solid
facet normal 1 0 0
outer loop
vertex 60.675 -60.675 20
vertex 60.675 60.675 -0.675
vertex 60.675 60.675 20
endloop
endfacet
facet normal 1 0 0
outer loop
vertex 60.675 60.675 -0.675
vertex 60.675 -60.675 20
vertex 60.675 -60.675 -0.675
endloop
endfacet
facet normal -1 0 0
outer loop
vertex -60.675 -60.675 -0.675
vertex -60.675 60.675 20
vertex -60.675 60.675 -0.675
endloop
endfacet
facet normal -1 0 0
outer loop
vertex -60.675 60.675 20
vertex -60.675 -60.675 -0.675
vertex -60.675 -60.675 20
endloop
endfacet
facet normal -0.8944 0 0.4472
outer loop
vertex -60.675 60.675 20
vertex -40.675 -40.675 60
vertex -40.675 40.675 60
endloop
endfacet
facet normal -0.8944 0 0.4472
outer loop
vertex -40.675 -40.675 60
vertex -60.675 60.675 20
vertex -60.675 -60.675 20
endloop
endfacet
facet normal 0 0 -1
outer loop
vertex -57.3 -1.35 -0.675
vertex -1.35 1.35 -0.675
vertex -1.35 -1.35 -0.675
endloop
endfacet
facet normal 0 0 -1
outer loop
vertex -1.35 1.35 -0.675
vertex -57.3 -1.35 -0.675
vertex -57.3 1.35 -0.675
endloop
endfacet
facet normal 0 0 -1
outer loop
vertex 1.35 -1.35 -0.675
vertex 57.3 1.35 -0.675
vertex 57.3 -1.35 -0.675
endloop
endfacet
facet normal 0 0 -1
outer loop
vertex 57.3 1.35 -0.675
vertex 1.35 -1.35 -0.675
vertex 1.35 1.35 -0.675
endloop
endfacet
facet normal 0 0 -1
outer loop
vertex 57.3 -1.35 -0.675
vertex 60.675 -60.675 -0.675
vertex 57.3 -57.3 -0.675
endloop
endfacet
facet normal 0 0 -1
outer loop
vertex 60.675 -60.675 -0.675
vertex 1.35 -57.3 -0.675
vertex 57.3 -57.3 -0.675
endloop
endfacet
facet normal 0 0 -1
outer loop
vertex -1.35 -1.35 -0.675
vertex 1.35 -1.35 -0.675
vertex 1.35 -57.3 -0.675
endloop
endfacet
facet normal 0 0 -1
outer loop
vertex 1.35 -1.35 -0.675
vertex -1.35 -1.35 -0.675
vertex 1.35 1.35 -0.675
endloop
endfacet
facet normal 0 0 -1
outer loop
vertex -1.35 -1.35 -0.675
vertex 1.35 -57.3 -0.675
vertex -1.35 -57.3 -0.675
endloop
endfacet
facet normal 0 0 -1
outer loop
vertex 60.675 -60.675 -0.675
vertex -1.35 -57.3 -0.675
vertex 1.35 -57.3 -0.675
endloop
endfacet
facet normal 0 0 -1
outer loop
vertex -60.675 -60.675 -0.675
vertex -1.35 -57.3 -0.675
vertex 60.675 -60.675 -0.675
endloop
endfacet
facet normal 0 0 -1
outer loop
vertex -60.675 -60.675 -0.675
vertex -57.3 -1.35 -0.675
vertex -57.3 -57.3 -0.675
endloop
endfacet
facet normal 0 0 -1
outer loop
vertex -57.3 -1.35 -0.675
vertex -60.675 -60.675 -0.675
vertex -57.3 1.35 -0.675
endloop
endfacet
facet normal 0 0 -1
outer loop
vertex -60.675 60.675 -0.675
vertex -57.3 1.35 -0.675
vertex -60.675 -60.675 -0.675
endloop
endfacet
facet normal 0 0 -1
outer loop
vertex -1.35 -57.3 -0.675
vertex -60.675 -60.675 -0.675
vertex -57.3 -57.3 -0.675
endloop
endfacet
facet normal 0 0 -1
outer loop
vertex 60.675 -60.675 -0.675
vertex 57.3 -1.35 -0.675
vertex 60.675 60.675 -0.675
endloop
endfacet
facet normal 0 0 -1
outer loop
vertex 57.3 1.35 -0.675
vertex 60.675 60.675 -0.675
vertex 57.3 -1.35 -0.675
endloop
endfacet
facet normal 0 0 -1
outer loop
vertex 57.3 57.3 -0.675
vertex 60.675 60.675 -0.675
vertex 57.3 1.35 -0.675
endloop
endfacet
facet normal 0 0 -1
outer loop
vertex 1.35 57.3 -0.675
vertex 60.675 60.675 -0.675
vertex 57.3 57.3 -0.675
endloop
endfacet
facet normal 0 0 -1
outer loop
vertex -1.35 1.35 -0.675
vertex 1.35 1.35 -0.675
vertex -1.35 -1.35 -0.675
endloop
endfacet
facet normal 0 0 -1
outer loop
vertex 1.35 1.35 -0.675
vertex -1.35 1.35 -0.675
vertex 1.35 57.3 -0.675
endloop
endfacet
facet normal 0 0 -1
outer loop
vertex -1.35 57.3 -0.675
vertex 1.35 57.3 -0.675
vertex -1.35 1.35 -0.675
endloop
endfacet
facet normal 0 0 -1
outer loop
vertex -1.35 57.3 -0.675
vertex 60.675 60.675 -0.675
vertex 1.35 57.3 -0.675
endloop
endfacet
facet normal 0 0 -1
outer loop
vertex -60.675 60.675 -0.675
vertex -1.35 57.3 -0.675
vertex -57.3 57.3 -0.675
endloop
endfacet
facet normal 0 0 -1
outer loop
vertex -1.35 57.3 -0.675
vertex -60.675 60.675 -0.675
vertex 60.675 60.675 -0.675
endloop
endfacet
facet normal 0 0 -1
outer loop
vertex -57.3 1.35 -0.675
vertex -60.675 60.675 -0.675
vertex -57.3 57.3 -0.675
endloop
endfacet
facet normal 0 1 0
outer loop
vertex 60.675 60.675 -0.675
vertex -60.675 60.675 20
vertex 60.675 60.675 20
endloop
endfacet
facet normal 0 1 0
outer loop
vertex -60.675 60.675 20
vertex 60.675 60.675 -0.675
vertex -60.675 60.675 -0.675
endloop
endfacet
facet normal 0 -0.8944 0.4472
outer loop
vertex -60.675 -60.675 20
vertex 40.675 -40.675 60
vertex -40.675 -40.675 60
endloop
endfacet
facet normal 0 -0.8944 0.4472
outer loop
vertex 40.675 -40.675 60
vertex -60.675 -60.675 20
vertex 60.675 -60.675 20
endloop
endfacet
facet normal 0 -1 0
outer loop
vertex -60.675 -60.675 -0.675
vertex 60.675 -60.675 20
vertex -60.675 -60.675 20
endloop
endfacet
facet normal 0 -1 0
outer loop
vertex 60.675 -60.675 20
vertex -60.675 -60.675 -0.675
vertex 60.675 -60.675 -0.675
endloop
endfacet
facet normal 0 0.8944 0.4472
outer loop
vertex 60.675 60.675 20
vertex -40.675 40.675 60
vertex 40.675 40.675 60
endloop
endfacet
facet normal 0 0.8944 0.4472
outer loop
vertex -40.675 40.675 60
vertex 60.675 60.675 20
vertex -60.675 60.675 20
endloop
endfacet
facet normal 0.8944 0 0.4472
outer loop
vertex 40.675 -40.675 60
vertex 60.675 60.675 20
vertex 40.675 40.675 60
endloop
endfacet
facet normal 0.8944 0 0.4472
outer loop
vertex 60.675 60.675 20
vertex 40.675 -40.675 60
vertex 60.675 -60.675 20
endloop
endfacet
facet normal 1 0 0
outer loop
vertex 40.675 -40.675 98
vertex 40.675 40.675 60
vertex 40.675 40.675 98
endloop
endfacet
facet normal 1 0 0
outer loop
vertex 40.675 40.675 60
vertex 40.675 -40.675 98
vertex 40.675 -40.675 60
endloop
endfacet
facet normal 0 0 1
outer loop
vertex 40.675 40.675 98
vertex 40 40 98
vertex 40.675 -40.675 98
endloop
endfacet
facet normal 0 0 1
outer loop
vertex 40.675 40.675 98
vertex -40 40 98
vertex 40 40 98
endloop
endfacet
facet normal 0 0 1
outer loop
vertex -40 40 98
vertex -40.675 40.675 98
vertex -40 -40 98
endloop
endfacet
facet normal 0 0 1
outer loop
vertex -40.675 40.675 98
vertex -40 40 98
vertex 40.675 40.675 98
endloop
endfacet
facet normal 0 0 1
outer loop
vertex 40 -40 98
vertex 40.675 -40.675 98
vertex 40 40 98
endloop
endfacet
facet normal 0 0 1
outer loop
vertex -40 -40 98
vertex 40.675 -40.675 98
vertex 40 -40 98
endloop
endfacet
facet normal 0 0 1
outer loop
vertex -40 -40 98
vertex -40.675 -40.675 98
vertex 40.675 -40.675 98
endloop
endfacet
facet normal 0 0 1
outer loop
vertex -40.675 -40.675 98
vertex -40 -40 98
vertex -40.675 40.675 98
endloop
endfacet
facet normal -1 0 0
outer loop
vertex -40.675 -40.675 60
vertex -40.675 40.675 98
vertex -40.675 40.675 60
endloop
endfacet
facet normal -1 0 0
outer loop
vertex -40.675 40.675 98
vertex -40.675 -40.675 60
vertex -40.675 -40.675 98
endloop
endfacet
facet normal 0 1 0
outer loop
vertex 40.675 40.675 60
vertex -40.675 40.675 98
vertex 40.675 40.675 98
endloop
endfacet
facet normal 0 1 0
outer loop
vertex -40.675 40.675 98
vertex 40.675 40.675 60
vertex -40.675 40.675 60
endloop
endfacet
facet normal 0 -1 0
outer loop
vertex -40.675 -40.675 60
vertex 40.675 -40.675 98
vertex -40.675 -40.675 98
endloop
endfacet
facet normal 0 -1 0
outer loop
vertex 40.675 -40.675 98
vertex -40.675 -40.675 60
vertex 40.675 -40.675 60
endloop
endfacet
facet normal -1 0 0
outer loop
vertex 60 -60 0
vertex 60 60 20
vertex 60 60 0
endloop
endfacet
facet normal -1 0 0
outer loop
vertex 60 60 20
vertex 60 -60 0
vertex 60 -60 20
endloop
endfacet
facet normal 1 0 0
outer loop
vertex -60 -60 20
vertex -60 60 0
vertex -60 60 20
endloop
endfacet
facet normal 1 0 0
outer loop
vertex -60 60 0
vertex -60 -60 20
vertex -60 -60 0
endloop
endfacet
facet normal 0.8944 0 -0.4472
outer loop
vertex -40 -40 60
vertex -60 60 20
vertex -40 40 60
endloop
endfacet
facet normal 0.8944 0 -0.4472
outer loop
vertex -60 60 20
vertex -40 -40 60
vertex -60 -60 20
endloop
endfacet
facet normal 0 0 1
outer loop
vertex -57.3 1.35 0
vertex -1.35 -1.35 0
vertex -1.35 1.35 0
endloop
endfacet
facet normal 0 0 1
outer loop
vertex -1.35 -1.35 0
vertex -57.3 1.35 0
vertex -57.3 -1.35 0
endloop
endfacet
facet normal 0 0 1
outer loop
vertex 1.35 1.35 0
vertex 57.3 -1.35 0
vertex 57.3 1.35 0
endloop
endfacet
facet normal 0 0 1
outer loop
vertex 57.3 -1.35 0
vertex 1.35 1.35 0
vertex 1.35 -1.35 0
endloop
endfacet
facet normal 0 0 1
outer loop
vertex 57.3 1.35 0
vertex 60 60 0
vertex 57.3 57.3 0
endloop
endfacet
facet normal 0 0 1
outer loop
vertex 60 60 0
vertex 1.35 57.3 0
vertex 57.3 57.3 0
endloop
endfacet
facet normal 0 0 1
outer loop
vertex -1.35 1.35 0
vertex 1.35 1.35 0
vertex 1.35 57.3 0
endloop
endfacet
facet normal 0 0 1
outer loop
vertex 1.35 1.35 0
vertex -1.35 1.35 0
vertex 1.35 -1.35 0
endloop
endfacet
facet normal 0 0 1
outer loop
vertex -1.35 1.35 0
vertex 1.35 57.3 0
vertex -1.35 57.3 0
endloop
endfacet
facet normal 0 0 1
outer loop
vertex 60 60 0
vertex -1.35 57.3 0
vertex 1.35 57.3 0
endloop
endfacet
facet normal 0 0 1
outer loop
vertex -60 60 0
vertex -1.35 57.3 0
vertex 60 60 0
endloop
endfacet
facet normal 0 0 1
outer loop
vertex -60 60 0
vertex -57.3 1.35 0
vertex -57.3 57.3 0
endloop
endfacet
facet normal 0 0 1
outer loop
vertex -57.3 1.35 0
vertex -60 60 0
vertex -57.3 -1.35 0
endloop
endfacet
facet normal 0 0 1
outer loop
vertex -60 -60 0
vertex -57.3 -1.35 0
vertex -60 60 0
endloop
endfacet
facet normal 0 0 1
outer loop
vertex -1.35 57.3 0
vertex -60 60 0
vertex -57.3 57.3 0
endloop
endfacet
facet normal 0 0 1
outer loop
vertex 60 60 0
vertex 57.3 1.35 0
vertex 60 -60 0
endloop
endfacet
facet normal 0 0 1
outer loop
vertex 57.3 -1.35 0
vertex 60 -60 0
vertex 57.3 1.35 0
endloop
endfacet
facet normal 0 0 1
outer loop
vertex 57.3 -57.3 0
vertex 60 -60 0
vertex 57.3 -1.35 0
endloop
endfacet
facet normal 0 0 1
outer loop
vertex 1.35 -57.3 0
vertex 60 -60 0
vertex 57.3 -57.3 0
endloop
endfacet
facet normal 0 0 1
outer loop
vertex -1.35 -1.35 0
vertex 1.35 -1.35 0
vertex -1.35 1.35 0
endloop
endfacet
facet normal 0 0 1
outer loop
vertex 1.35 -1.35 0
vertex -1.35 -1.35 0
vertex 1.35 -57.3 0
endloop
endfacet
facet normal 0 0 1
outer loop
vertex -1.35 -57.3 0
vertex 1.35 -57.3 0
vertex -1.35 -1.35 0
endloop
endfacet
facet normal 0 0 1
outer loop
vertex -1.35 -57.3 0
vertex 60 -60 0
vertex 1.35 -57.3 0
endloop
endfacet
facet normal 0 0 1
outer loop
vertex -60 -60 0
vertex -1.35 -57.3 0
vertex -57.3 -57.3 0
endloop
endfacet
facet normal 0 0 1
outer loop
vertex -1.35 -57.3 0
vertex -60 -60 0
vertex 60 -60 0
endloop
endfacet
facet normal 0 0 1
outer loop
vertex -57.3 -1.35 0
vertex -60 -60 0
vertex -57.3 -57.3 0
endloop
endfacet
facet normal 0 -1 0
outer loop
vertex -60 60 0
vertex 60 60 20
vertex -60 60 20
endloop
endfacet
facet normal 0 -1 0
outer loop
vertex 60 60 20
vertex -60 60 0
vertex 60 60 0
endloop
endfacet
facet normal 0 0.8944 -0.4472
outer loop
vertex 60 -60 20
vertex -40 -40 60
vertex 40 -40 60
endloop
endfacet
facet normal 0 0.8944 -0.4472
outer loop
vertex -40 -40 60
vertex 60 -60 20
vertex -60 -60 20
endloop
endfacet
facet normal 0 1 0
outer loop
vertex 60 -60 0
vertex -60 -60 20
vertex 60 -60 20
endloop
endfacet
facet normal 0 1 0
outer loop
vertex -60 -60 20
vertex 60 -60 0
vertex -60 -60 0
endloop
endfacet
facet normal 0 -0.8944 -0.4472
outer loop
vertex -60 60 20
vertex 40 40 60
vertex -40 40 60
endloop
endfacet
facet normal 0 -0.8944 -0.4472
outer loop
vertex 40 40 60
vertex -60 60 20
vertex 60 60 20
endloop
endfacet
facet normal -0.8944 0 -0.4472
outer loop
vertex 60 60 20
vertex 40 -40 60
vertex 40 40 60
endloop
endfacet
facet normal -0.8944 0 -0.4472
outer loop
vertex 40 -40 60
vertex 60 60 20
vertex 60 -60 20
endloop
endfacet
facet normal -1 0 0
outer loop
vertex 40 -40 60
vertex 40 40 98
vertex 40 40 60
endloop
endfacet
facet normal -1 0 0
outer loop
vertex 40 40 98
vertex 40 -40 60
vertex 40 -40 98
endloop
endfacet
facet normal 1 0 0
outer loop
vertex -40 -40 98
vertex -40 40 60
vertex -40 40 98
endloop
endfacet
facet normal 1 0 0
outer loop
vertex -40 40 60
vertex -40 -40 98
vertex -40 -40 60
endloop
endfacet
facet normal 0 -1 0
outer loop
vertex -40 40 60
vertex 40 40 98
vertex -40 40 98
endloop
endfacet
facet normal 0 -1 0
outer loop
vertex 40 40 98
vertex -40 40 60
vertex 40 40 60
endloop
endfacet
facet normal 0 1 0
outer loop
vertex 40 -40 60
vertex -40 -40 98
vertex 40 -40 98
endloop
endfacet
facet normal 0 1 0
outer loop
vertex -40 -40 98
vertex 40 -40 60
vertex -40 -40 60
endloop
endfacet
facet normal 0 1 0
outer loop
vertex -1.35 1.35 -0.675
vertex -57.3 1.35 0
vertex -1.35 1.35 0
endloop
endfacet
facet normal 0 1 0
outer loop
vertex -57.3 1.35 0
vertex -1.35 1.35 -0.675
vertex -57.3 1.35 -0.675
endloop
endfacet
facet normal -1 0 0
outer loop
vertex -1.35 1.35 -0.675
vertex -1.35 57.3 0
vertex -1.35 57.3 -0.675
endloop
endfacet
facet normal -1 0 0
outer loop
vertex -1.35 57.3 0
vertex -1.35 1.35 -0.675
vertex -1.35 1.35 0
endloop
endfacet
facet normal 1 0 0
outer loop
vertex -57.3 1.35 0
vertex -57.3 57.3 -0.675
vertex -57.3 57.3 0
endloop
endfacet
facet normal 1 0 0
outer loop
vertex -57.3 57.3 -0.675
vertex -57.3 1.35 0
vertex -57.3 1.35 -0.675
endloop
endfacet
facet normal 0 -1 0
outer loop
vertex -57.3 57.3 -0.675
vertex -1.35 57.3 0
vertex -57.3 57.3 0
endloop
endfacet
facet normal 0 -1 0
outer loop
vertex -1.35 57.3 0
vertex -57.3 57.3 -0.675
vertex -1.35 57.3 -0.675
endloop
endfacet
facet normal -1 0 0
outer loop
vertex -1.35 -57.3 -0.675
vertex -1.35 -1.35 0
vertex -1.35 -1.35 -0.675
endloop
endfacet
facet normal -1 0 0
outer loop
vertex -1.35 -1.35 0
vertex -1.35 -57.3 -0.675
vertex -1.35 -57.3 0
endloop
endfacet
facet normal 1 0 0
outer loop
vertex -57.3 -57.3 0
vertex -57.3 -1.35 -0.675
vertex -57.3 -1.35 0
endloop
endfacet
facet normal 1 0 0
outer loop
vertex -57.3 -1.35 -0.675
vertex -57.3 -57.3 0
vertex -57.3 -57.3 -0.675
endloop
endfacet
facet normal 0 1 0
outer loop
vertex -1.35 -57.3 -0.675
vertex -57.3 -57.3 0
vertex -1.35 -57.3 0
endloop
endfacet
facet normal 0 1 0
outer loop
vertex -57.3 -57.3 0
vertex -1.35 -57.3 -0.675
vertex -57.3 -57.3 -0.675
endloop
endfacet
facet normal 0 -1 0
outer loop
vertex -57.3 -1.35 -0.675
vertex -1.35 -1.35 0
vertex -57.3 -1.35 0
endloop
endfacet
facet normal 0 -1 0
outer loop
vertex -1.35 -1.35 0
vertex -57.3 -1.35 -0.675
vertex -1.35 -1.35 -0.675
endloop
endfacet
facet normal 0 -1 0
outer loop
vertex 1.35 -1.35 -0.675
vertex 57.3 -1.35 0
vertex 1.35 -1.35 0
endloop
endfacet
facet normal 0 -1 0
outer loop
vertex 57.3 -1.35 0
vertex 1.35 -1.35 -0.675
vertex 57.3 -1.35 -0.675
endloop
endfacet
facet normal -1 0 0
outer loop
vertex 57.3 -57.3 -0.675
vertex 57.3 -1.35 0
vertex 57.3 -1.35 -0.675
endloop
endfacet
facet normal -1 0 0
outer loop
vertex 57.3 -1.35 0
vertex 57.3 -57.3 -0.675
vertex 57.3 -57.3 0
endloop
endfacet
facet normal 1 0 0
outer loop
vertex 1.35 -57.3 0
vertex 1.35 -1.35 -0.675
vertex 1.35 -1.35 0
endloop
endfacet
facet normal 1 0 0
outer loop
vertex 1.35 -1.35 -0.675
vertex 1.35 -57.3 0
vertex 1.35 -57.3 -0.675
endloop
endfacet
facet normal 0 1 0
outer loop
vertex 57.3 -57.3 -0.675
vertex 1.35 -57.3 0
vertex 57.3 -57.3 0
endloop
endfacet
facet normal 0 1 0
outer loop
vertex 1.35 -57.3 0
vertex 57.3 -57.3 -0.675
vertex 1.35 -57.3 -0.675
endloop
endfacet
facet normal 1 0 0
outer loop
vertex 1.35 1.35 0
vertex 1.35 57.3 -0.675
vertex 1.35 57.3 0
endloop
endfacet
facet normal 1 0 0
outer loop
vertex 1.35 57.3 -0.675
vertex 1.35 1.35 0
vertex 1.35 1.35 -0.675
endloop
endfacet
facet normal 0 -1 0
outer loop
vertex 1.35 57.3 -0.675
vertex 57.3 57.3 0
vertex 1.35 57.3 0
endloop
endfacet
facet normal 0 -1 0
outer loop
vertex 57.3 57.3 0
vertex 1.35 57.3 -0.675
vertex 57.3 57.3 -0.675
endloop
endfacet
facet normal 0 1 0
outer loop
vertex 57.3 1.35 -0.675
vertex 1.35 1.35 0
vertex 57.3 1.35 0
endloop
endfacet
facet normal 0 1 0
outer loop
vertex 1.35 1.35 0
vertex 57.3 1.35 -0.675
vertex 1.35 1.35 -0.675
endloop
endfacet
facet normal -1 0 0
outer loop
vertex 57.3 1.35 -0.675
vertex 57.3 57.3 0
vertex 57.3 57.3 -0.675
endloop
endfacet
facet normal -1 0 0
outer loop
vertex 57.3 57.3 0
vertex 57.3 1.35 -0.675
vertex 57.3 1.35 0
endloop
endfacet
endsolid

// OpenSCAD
/*

# Part 1: discovery
to maximize air flow
I need to minimize resistance
while retaining a minimum dwell time
which just means using all my filter media
which has a constant volume V = Area * Thickness

# Part 2: Equations

dwell time = thickness / linear velocity
linear velocity = volume flow rate / Area

dwell time = thickness / (volume flow rate / area)
           = volume / volume flow rate (oh wait duh)

volume flow rate ~~ Pslope * (Static Pressure - pressure drop)  (I know this experimentally)
pressure drop ~~ Unkonwn * thickness/area     (also depends on velocity)


dwell time = volume / (Pslope * (Static Pressure - pressure drop))
           = volume / (Pslope * (Static Pressure - unknown * thickness/area))

wait no we were looking for volume flow rate as a function of aspect ratio

volume flow rate ~~ (Static Pressure - pressure drop)
                 ~~ (Static Pressure - ...
(I got confused)

# Part 3: reframing

A fan has two intrinsic properties, max unobstructed flow and max static pressure
This is similar to a battery's short circuit current and voltage
max unobstructed flow is really more like max static pressure / resistance

I'll start by  this like V=iR, then rearranging until volume flow rate is on the left
    Static Pressure = volume flow rate * (Resistance of Fan + Resistance of Filter)
    ==>  volume flow rate = Static Pressure / (Resistance of Fan + Resistance of Filter)
    ==>  volume flow rate = Static Pressure / (Resistance of Fan + Resistivity of Filter Media * Thickness / Area)

Then we define dwell time, then follow definitions until we have our base constants
    dwell time = thickness / linear velocity
               = thickness / (volume flow rate / area)
               = thickness * area / (volume flow rate)
               = volume / volume flow rate
This checks out: dwell time is like the inverse of how often the whole volume gets replaced

We want to be above a minimum dwell time, which we can represent with an inequality:
    actual dwell time >= safe dwell time
    ==> volume / volume flow rate  >= safe dwell time
    ==> volume / safe dwell time >= volume flow rate
    ==> volume flow rate =< volume / safe dwell time
which makes sense: a longer dwell time would require a slower flow rate
now we can combine both equations for volume flow rate
    Static Pressure / (Resistance of Fan + Resistivity of Filter Media * Thickness / Area) =< volume / safe dwell time
    ==> static pressure * safe dwell time =< volume * (Resistance of Fan + Resistivity of Filter Media * Thickness / Area)
    ==> static pressure * safe dwell time =< volume * Resistance of Fan + volume * Resistivity of Filter Media * Thickness / Area
    ==> static pressure * safe dwell time =< volume * Resistance of Fan + Resistivity of Filter Media * Thickness^2
    ==> thickness >= sqrt( (static pressure * safe dwell time - volume * Resistance of Fan) / resistivity of filter media)
which answers the question "what should the thickness be if I use all my pellets"

# Part 4: Getting an intuition because I don't have numbers anyway

It would be useful to have dwell time alone on the left to see what happens as I poke and prod
    dwell time = volume / volume flow rate
               = volume / (Static Pressure / (Resistance of Fan + Resistivity of Filter Media * Thickness / Area))
               = volume * (Resistance of Fan + Resistivity of Filter Media * Thickness / Area) / Static Pressure
However the fan doesn't have a constant internal resistance and I'm not sure V=iR for filter media either

# Wait actually

To find the steady state its as simple as overlapping two graphs
1. the flow vs pressure drop graph from the spec sheet
2. the pressure "force" vs flow graph for the filter

the "resistivity of carbon" is a function f(area, thickness, flow) -> pressure drop

dwell time = thickness * area / volume flow rate

 */




//anyway

// from http://gdstime.com/product/?99_543.html
fan_hole_spacing = 71.5;
fan_width = 80.0;
fan_thickness = 38;
fan_wall_thickness = 2.0;
screw_diameter=4.0;
nut_waf=7;
nut_h=3;
//measured
fan_back_od = 82.42;
fan_front_od = 83.72;
fan_back_id = 45.5 ;
fan_front_id = 40;

module fustrum(t=0,ep=0){
    w1=120+2*t;
    w2=fan_width+2*t;
    dh=w1-w2;
    hull(){
        translate([-w1/2,-w1/2,-t]) cube([w1,w1, 20+t]);
        translate([-w2/2,-w2/2,0]) cube([w2,w2,20+dh]);
    }
    translate([-w2/2,-w2/2,0]) cube([w2,w2,20+dh+fan_thickness+ep]);
}

t=.675;
w=120+2*t;
difference(){
    fustrum(t,0);
    fustrum(0,.1);
    for(i=[1:4]){
        rotate([0,0,i*90]) mirror([0,0,1]) translate([2*t,2*t,-1]) cube(120/2-6*t);
    }
}
